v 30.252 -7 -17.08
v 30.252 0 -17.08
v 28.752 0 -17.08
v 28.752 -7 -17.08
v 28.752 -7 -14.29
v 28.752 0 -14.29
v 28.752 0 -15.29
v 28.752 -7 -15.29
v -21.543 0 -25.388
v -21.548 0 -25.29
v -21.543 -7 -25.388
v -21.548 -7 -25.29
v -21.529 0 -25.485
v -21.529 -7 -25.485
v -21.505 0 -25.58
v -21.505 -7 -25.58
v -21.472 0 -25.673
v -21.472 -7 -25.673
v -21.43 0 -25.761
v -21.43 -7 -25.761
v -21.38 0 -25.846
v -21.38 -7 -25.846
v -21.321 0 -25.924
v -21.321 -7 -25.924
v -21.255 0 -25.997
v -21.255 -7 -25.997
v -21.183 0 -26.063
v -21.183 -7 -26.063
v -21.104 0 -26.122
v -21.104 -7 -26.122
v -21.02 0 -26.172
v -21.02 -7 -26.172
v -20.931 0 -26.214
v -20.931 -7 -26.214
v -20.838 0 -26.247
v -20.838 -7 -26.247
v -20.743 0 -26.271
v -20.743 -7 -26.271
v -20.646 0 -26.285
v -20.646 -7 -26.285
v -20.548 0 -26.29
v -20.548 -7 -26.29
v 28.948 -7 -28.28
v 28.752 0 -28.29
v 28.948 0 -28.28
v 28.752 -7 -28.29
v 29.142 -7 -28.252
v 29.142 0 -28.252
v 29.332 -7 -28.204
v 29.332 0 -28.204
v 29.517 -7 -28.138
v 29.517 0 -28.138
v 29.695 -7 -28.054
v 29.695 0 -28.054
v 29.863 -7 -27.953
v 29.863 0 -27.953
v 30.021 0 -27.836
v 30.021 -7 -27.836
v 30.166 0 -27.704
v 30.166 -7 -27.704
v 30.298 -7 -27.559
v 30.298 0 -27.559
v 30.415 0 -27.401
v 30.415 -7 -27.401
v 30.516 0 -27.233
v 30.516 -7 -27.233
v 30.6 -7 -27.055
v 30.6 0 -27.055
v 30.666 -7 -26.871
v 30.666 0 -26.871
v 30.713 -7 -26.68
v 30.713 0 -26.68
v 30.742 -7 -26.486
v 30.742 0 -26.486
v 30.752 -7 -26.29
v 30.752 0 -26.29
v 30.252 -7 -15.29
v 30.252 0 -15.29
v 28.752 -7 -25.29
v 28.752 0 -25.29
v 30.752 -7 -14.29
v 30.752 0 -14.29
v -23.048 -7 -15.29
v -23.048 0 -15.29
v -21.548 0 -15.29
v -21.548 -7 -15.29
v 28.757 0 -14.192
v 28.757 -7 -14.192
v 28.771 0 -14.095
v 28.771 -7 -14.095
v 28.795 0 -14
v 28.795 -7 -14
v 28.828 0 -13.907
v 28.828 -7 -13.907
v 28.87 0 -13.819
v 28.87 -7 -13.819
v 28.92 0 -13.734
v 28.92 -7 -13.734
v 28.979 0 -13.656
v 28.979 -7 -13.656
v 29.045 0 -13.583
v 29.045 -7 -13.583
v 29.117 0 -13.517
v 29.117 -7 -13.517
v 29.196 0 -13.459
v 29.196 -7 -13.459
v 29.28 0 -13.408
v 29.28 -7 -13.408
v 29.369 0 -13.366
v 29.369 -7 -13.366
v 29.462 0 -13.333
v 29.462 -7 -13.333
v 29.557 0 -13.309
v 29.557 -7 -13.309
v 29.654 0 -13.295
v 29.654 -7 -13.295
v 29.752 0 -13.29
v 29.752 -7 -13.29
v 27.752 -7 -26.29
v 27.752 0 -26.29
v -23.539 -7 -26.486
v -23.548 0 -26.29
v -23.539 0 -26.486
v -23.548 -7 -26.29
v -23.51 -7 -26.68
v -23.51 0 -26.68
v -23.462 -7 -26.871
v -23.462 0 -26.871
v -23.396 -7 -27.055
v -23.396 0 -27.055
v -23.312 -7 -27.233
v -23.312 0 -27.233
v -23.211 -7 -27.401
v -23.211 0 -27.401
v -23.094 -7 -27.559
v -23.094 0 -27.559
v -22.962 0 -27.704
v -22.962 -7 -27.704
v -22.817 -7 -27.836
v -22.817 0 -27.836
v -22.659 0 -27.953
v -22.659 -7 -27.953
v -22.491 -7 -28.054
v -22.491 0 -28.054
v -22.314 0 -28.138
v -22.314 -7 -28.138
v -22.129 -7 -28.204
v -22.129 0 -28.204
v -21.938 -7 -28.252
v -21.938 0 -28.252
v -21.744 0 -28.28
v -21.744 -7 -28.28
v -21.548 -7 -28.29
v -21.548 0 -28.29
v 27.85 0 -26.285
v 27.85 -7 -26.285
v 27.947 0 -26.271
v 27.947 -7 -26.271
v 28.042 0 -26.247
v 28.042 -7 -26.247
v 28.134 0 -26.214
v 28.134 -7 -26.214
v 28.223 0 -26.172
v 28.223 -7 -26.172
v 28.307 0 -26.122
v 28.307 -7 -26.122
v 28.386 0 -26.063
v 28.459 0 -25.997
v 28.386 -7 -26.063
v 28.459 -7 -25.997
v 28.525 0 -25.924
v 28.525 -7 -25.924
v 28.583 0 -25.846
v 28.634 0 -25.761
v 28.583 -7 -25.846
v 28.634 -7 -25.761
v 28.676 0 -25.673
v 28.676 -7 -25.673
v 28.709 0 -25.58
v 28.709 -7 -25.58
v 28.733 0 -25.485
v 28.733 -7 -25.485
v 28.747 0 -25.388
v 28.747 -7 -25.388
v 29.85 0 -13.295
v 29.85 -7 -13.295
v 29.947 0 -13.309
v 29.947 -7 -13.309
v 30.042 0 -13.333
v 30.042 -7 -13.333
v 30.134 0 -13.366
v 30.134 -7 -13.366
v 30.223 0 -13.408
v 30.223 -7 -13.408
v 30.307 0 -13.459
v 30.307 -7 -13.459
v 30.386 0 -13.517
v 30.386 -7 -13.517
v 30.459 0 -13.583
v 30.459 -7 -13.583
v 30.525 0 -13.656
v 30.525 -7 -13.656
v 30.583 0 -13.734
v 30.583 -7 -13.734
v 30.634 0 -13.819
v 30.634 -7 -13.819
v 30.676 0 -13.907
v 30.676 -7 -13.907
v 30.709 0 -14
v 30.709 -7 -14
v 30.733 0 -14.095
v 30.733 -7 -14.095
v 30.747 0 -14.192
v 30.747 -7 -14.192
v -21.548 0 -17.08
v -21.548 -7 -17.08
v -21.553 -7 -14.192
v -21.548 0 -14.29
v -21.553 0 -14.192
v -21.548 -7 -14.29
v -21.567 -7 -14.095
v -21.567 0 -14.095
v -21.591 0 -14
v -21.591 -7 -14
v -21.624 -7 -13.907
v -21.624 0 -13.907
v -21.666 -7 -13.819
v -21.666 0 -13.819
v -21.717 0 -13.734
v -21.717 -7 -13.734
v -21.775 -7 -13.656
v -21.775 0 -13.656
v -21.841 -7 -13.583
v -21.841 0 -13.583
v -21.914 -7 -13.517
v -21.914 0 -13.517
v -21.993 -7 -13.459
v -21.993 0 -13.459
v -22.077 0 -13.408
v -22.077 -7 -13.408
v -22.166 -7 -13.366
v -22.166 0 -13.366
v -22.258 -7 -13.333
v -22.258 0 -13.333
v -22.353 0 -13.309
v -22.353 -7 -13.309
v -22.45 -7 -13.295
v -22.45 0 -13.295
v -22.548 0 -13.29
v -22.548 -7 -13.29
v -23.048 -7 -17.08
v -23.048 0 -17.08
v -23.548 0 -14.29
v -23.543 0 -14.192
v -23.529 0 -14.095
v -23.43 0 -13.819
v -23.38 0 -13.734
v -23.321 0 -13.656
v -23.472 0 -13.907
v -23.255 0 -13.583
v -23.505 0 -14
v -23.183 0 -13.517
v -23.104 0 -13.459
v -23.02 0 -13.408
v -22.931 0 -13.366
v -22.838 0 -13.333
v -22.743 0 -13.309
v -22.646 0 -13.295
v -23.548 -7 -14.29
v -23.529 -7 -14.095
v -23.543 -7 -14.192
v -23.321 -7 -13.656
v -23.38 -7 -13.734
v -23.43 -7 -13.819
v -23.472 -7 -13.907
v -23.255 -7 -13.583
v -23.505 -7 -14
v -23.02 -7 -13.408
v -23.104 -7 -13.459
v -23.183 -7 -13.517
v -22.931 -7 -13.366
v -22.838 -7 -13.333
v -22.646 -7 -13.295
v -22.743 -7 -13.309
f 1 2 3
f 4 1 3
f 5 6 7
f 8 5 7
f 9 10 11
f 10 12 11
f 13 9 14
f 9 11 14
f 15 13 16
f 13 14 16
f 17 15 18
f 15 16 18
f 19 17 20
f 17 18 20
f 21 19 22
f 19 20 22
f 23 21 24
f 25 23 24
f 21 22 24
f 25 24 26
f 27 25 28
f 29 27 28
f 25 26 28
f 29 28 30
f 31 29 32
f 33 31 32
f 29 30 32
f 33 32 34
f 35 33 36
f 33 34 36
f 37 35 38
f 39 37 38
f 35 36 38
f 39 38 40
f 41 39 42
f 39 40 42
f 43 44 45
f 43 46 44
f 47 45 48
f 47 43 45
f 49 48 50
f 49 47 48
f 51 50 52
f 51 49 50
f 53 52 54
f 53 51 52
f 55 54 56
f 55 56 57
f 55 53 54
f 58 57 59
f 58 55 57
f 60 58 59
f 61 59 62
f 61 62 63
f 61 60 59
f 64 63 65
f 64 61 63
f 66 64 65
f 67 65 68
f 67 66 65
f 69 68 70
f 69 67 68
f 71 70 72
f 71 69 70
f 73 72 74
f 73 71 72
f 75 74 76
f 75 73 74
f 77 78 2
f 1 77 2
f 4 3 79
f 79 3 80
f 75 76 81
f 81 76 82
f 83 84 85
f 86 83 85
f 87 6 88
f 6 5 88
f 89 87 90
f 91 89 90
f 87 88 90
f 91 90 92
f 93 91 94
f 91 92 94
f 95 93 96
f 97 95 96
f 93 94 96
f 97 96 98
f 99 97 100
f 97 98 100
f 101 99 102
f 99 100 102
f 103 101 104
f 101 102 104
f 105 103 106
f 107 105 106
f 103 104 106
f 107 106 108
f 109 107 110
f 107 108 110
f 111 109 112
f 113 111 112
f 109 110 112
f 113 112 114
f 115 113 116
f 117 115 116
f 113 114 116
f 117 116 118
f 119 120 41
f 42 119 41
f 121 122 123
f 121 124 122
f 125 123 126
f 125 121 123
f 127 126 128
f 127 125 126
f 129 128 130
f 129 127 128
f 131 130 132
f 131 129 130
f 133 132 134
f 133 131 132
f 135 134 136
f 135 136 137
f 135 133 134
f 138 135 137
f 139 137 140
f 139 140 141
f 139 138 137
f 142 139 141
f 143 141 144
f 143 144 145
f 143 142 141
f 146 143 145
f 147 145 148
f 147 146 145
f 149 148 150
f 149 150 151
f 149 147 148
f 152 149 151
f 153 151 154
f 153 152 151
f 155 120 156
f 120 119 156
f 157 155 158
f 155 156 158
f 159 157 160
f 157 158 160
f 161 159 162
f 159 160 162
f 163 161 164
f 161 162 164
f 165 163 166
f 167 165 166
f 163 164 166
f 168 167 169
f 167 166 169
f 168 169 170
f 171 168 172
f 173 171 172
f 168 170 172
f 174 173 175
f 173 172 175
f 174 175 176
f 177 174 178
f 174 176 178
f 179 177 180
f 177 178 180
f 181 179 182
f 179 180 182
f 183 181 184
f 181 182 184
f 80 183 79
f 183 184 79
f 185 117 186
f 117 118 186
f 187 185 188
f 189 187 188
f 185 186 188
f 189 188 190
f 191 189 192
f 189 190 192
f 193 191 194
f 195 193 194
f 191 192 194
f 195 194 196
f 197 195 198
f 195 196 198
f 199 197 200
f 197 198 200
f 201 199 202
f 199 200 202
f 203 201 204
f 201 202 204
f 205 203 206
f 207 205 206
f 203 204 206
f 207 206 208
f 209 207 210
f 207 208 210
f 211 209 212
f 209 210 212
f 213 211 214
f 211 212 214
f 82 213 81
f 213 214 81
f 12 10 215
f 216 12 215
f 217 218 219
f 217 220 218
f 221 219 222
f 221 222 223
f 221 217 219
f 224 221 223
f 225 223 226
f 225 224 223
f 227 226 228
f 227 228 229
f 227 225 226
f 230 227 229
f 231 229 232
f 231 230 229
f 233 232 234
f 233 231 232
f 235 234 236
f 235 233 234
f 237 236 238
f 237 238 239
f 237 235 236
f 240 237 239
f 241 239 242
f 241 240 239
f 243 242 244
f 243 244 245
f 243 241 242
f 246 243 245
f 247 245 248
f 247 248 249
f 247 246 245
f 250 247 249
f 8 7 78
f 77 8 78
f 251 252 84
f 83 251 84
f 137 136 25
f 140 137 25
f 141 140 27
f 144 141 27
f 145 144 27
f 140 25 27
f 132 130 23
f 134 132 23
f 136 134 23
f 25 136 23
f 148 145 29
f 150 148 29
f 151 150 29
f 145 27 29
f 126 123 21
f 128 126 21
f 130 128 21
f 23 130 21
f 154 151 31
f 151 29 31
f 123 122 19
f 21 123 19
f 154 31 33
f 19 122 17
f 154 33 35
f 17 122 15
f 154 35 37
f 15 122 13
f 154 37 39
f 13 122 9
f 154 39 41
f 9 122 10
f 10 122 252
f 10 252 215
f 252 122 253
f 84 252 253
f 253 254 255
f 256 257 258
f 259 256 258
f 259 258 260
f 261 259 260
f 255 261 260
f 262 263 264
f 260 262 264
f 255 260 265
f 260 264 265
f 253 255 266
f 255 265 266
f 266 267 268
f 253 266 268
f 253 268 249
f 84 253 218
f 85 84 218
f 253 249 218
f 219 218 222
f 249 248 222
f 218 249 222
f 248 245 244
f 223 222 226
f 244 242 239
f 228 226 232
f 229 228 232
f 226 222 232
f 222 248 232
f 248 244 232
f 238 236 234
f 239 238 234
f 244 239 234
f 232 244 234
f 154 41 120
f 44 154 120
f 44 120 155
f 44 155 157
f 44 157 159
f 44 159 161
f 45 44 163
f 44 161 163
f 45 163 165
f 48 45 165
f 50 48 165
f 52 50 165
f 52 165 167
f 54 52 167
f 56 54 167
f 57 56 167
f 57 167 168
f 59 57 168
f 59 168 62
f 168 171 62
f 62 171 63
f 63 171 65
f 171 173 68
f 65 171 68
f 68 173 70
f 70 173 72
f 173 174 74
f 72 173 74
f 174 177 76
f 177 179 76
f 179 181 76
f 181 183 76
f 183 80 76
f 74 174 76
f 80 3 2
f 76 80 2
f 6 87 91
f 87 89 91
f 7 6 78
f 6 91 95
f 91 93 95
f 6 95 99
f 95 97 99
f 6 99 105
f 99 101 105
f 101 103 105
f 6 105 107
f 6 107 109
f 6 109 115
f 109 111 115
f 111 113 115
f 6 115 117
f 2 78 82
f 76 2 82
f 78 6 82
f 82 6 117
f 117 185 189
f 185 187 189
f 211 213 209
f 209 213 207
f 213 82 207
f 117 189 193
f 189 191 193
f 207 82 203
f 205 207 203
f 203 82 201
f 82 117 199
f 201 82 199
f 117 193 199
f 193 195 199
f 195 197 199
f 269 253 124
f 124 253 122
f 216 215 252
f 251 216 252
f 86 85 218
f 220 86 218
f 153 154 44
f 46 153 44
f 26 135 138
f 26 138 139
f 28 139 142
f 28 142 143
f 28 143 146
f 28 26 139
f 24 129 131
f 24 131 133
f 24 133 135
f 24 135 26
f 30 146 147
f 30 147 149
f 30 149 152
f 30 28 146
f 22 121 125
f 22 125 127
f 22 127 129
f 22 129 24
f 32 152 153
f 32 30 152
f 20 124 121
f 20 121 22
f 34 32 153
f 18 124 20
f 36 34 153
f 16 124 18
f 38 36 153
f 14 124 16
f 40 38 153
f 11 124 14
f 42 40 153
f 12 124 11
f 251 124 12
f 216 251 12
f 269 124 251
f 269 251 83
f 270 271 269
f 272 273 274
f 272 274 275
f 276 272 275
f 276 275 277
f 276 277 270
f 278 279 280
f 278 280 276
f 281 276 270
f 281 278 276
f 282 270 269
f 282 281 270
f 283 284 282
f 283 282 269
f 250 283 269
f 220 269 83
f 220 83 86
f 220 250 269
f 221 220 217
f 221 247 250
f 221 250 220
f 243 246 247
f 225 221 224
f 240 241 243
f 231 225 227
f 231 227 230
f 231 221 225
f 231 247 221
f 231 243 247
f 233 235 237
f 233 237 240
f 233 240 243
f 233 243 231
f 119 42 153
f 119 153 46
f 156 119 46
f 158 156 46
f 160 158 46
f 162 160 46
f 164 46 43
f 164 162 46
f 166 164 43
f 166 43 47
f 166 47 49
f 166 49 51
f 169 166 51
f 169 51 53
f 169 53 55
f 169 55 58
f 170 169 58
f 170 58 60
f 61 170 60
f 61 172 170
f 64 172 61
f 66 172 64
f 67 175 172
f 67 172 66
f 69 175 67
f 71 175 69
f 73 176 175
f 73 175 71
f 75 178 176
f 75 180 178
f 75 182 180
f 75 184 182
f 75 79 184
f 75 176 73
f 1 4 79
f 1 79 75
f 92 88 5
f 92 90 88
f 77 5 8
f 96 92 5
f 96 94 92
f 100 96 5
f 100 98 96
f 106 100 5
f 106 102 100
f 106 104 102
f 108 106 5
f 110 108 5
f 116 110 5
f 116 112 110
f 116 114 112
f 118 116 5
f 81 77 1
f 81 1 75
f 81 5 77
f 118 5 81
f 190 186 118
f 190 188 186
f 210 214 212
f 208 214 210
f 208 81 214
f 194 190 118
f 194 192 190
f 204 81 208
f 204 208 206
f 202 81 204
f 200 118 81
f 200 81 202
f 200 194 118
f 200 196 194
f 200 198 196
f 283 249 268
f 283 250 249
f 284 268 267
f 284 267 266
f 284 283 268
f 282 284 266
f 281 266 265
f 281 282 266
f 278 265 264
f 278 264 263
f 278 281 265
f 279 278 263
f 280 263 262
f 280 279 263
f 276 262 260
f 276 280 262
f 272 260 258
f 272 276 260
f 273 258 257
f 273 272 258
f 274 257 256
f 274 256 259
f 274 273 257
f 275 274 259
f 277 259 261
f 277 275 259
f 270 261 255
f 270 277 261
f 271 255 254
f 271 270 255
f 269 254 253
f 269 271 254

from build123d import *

# Parameters (mm, degrees)
F1_DEPTH = 7
F2_R     = 2
F3_R     = 1
F4_R     = 0.99999


# Not quite as in the source:
# - a fillet or chamfer is up to 0.001 mm smaller than in the source, because OpenCascade refuses the exact size


with BuildPart() as f1:
    # F0 (on Front) → F1 (new body)
    with BuildSketch(Plane.XZ):
        Polygon((-21.5481998797, -13.2900460566), (-23.5481998797, -13.2900460566), (-23.5481998797, -28.2900460566), (30.7518001203, -28.2900460566), (30.7518001203, -13.2900460566), (28.7518001203, -13.2900460566), (28.7518001203, -15.2900460566), (30.2518001203, -15.2900460566), (30.2518001203, -17.0800460566), (28.7518001203, -17.0800460566), (28.7518001203, -26.2900460566), (-21.5481998797, -26.2900460566), (-21.5481998797, -17.0800460566), (-23.0481998797, -17.0800460566), (-23.0481998797, -15.2900460566), (-21.5481998797, -15.2900460566), align=None)
    extrude(amount=F1_DEPTH)

    # F2
    f2_edges = [f1.edges().sort_by_distance(p)[0] for p in [
        (-23.5482, -3.5, -28.290046),
        (30.7518, -3.5, -28.290046),
    ]]
    fillet(f2_edges, radius=F2_R)

    # F3
    f3_edges = [f1.edges().sort_by_distance(p)[0] for p in [
        (-21.5482, -3.5, -26.290046),
        (28.7518, -3.5, -26.290046),
    ]]
    fillet(f3_edges, radius=F3_R)

    # F4 (radius 1 in the source; OpenCascade refuses exactly that, so slightly less here)
    f4_edges = [f1.edges().sort_by_distance(p)[0] for p in [
        (-23.5482, -3.5, -13.290046),
        (30.7518, -3.5, -13.290046),
        (-21.5482, -3.5, -13.290046),
        (28.7518, -3.5, -13.290046),
    ]]
    fillet(f4_edges, radius=F4_R)


solid = f1.part
